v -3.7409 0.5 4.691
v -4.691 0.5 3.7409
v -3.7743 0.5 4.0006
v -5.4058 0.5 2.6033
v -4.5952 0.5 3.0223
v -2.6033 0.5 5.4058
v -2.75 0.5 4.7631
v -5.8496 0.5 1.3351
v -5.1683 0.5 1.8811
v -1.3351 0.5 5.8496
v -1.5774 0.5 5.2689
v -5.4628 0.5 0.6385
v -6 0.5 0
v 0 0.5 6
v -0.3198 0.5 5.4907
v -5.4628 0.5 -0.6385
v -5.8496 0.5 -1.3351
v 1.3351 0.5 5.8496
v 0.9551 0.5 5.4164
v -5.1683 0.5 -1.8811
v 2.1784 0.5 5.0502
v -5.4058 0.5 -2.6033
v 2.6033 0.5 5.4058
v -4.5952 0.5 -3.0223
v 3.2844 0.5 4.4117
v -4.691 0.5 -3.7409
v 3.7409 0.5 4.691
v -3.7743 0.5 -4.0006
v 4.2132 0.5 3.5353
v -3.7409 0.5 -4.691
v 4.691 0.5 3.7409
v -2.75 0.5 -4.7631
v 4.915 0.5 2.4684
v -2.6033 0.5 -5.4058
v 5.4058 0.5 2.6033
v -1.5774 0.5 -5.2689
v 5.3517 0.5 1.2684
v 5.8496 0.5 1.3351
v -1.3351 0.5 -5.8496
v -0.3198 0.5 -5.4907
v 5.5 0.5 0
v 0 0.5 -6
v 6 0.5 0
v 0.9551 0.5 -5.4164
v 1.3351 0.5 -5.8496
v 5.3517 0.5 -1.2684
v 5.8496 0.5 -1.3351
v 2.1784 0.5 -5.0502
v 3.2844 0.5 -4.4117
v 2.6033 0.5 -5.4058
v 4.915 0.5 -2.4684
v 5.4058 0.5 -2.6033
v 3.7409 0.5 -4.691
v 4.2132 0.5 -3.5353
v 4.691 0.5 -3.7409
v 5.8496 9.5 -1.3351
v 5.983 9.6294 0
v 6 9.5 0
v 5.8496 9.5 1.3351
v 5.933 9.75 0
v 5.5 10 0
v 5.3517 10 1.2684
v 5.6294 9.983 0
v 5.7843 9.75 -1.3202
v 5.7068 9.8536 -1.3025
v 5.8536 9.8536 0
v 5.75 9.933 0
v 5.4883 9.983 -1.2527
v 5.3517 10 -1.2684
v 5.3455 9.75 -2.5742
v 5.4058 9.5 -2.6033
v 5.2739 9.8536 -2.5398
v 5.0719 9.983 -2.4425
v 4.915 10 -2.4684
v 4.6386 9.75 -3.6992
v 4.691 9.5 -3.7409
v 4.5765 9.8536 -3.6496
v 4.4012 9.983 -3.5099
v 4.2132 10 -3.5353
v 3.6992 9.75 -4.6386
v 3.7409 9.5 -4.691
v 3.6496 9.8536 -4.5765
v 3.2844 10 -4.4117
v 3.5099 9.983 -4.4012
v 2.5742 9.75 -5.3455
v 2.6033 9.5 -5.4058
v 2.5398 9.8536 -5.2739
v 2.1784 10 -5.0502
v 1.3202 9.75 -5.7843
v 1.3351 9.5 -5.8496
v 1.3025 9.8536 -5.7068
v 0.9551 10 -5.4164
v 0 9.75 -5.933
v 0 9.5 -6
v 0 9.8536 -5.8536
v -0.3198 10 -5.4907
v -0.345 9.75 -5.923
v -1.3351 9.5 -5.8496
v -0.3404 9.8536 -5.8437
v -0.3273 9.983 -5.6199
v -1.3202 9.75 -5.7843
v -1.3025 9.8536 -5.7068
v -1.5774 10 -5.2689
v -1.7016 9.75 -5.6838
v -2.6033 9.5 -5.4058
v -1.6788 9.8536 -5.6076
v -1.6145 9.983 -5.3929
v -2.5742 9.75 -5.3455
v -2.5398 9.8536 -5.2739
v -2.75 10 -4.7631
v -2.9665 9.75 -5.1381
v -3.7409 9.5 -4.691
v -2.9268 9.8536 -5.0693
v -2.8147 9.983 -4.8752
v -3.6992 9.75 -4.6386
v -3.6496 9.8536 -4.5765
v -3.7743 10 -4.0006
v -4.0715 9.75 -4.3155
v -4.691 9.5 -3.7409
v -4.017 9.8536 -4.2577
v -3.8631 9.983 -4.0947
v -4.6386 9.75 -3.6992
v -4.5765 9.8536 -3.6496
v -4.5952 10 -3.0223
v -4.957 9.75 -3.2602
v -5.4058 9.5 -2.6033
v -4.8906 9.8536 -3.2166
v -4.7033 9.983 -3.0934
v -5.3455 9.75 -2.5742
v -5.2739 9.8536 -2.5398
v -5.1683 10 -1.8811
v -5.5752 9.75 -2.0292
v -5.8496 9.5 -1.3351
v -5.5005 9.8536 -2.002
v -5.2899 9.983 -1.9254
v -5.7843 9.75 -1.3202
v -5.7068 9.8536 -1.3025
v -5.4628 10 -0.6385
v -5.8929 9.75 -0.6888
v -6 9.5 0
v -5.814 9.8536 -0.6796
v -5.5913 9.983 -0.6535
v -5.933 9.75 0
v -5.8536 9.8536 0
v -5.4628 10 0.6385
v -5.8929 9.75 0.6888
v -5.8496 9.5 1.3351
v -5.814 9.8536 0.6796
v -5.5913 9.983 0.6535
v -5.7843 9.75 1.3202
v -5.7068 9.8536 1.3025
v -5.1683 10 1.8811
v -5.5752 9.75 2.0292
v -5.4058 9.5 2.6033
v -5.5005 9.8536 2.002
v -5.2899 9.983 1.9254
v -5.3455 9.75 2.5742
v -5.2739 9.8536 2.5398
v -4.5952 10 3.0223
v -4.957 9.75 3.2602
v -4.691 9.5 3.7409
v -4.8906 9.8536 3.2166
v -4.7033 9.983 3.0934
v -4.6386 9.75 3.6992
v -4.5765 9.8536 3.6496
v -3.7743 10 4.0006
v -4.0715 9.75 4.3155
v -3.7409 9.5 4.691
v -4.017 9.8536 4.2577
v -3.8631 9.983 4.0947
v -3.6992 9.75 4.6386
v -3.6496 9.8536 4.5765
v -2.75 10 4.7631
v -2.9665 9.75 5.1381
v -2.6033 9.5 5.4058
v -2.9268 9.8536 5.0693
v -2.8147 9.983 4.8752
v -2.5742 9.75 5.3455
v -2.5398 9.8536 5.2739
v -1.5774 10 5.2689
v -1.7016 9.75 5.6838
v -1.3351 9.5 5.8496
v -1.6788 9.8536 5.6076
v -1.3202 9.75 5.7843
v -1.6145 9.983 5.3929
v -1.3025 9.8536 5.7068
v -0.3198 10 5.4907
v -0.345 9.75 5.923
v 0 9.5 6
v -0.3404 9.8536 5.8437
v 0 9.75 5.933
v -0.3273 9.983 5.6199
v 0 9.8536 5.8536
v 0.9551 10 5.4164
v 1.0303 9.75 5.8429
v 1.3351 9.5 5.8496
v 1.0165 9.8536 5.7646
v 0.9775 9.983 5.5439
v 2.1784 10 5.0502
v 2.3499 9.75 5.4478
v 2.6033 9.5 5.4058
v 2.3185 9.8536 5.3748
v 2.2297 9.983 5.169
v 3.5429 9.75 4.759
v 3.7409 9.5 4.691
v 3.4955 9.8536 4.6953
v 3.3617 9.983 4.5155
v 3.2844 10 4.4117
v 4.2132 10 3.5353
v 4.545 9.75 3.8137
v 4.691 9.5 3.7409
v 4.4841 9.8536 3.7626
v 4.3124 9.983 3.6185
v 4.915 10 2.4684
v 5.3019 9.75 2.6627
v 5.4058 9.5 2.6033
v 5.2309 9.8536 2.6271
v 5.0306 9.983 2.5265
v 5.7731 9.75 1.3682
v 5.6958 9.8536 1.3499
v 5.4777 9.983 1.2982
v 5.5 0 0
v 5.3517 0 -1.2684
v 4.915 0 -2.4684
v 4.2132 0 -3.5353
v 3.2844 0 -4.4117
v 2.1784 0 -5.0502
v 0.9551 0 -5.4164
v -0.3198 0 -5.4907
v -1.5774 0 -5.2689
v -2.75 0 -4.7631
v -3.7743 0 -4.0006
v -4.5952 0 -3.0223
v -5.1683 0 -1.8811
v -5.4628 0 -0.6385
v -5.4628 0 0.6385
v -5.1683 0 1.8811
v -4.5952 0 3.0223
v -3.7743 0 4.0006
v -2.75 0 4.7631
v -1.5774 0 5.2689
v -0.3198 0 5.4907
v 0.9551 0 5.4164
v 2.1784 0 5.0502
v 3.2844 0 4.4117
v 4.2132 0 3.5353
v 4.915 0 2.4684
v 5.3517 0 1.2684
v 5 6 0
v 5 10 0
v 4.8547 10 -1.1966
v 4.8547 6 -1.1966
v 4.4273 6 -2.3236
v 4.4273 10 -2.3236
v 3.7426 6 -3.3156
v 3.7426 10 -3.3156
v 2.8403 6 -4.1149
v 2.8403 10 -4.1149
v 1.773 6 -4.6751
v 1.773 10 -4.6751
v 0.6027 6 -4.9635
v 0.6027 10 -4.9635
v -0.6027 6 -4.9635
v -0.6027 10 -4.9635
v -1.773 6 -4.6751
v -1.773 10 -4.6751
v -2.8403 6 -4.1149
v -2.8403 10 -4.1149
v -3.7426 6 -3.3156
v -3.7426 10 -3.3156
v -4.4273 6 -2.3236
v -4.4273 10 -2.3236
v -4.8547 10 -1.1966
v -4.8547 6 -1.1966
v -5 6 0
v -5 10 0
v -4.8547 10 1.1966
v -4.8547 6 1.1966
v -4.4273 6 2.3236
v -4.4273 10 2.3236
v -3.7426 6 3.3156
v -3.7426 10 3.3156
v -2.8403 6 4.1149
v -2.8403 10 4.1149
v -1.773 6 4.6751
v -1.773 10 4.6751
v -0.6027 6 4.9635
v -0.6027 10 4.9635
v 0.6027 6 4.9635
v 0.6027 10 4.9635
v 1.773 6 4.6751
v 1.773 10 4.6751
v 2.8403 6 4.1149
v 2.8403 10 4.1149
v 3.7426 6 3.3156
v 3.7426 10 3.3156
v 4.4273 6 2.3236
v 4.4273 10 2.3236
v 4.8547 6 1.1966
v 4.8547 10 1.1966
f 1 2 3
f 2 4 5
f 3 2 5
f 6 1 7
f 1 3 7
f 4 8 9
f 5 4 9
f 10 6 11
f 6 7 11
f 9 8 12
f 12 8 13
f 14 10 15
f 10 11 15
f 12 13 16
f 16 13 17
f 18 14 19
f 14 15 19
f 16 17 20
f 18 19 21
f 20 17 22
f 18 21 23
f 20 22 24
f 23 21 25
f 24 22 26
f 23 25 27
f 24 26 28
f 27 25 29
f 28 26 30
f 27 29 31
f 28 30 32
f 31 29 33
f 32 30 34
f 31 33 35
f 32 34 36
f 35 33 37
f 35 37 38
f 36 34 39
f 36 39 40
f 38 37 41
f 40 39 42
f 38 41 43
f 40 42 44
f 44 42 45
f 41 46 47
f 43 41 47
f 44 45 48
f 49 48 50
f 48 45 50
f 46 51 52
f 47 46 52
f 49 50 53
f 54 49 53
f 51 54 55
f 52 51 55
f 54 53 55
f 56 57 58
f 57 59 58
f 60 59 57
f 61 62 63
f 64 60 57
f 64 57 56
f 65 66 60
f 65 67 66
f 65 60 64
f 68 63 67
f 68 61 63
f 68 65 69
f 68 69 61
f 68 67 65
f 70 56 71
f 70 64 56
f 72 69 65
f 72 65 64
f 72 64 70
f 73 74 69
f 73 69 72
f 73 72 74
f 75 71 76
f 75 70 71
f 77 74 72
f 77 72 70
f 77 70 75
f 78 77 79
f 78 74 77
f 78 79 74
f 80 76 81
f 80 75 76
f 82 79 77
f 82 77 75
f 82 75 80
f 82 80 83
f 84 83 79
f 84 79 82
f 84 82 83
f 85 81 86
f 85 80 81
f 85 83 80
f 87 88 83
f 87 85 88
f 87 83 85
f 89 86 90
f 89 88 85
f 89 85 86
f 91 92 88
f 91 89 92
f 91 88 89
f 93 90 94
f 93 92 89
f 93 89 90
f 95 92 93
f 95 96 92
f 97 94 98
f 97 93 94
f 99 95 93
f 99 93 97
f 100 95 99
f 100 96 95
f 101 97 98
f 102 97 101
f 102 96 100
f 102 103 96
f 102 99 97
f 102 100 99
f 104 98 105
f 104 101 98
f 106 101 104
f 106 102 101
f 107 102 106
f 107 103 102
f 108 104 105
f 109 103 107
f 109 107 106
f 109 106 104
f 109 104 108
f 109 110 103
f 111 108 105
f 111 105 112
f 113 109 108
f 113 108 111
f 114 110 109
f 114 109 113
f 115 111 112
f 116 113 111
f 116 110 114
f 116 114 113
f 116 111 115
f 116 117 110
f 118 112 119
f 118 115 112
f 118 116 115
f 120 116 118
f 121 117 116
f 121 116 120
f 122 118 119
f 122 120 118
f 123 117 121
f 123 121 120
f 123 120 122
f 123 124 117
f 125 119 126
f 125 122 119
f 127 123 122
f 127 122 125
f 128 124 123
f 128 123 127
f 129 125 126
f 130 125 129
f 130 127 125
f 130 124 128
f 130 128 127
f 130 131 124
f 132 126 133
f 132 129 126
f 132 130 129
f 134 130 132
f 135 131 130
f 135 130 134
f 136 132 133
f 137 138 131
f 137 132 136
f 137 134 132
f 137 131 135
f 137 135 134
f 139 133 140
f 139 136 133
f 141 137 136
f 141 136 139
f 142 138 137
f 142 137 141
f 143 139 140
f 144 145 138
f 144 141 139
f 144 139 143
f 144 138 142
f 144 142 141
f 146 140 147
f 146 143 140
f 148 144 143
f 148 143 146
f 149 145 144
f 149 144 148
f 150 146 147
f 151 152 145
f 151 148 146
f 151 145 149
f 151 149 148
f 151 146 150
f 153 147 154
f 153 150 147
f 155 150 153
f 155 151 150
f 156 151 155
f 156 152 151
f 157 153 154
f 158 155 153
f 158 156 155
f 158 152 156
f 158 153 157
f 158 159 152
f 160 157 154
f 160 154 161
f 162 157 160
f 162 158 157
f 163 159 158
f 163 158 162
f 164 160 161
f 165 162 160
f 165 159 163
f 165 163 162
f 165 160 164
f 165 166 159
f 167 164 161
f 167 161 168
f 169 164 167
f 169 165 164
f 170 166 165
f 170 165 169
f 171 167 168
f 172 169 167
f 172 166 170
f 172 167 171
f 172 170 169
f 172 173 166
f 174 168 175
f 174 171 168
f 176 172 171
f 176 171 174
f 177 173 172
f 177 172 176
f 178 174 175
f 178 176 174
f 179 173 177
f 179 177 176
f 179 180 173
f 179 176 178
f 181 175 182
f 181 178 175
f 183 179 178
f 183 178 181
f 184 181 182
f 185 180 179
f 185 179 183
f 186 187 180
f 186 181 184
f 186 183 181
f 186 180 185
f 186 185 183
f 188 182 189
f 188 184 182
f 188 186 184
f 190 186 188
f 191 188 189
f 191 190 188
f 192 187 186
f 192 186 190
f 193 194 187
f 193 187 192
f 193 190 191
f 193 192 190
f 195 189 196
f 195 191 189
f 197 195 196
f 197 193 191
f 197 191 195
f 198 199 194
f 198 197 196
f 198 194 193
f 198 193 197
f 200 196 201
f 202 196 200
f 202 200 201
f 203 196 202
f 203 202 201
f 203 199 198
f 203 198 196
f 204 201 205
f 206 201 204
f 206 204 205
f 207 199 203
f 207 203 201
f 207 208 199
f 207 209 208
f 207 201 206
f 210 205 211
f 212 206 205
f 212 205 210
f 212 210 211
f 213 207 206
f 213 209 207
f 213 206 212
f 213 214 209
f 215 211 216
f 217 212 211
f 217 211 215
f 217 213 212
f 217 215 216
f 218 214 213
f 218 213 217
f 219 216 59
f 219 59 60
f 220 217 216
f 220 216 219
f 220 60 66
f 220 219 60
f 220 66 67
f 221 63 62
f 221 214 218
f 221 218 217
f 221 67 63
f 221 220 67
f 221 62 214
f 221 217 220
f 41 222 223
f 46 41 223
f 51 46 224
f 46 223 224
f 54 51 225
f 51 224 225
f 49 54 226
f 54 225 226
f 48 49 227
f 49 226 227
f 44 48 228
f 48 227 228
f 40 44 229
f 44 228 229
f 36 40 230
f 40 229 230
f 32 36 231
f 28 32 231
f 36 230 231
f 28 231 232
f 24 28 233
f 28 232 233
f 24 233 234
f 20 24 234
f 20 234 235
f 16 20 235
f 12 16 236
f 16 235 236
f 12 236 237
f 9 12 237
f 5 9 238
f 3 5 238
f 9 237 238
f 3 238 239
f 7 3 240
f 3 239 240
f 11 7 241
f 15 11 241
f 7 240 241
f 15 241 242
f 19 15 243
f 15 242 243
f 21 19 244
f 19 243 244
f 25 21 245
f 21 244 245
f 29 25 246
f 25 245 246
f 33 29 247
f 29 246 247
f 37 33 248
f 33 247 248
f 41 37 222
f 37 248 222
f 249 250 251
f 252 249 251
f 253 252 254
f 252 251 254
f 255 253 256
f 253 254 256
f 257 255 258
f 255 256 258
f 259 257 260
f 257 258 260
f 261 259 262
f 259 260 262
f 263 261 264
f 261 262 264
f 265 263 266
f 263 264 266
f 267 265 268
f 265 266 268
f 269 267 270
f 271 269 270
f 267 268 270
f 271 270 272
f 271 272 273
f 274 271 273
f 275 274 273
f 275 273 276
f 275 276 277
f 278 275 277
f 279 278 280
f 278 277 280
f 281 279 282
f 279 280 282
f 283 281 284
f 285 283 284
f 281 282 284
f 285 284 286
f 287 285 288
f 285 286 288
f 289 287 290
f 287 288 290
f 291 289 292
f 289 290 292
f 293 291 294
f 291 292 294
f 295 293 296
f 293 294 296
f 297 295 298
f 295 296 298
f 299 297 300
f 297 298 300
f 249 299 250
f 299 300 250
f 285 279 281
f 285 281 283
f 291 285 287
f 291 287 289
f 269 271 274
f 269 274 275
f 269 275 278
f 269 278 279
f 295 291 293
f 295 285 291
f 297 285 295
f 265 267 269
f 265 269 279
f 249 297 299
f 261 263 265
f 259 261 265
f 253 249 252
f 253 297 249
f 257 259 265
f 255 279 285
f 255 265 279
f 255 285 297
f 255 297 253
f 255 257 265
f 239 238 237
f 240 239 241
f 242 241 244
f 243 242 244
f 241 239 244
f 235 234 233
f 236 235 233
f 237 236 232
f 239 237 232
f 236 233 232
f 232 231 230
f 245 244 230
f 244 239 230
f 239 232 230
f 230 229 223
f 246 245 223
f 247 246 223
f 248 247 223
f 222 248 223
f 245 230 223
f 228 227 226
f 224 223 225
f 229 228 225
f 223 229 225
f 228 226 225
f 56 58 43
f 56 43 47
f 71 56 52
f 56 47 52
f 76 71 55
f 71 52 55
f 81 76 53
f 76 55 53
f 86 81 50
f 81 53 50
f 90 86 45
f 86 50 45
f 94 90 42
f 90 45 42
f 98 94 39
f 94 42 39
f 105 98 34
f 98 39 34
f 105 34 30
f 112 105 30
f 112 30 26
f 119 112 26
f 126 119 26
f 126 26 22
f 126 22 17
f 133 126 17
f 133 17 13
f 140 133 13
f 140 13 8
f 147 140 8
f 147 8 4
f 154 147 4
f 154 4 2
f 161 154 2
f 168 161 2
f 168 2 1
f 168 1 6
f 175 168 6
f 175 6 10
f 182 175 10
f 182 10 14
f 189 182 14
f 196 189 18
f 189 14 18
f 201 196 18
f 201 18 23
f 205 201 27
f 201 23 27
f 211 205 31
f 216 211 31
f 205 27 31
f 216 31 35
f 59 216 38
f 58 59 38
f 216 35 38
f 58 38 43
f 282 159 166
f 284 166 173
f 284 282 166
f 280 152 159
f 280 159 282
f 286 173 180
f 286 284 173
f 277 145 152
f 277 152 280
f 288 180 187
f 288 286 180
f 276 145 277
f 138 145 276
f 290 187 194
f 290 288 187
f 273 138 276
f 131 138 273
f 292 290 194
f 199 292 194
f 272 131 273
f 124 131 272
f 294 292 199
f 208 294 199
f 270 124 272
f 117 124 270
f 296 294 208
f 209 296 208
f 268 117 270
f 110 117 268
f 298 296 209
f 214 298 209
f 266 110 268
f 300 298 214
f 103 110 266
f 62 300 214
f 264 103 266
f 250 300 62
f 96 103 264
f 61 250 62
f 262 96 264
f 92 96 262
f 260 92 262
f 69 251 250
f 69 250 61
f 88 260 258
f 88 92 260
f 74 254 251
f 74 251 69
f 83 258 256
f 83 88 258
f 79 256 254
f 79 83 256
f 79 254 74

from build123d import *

# Parameters (mm, degrees)
SKETCH1_R           = 6
BOSS_EXTRUDE1_DEPTH = 10
FILLET1_R           = 0.5
SKETCH2_OUTSIDE_W   = 17.94
SKETCH2_OUTSIDE_H   = 17.94
SKETCH2_OUTSIDE_R   = 5.5
CUT_EXTRUDE11_DEPTH = 0.5
SKETCH3_R           = 5
CUT_EXTRUDE12_DEPTH = 4


with BuildPart() as part:
    # Sketch1 → Boss-Extrude1 (new body)
    with BuildSketch(Plane(origin=(0, 0, 0), x_dir=(1, 0, 0), z_dir=(0, 1, 0))):
        Circle(SKETCH1_R)
    extrude(amount=BOSS_EXTRUDE1_DEPTH)

    # Fillet1
    fillet1_edges = [part.edges().sort_by_distance(p)[0] for p in [
        (-6, 10, 0),
    ]]
    fillet(fillet1_edges, radius=FILLET1_R)

    # Sketch2 outside → Cut-Extrude11 (cut)
    with BuildSketch(Plane(origin=(0, 0, 0), x_dir=(1, 0, 0), z_dir=(0, 1, 0))):
        Rectangle(SKETCH2_OUTSIDE_W, SKETCH2_OUTSIDE_H)
        Circle(SKETCH2_OUTSIDE_R, mode=Mode.SUBTRACT)
    extrude(amount=CUT_EXTRUDE11_DEPTH, mode=Mode.SUBTRACT)

    # Sketch3 → Cut-Extrude12 (cut)
    with BuildSketch(Plane(origin=(0, 10, 0), x_dir=(1, 0, 0), z_dir=(0, 1, 0))):
        Circle(SKETCH3_R)
    extrude(amount=-CUT_EXTRUDE12_DEPTH, mode=Mode.SUBTRACT)


solid = part.part
